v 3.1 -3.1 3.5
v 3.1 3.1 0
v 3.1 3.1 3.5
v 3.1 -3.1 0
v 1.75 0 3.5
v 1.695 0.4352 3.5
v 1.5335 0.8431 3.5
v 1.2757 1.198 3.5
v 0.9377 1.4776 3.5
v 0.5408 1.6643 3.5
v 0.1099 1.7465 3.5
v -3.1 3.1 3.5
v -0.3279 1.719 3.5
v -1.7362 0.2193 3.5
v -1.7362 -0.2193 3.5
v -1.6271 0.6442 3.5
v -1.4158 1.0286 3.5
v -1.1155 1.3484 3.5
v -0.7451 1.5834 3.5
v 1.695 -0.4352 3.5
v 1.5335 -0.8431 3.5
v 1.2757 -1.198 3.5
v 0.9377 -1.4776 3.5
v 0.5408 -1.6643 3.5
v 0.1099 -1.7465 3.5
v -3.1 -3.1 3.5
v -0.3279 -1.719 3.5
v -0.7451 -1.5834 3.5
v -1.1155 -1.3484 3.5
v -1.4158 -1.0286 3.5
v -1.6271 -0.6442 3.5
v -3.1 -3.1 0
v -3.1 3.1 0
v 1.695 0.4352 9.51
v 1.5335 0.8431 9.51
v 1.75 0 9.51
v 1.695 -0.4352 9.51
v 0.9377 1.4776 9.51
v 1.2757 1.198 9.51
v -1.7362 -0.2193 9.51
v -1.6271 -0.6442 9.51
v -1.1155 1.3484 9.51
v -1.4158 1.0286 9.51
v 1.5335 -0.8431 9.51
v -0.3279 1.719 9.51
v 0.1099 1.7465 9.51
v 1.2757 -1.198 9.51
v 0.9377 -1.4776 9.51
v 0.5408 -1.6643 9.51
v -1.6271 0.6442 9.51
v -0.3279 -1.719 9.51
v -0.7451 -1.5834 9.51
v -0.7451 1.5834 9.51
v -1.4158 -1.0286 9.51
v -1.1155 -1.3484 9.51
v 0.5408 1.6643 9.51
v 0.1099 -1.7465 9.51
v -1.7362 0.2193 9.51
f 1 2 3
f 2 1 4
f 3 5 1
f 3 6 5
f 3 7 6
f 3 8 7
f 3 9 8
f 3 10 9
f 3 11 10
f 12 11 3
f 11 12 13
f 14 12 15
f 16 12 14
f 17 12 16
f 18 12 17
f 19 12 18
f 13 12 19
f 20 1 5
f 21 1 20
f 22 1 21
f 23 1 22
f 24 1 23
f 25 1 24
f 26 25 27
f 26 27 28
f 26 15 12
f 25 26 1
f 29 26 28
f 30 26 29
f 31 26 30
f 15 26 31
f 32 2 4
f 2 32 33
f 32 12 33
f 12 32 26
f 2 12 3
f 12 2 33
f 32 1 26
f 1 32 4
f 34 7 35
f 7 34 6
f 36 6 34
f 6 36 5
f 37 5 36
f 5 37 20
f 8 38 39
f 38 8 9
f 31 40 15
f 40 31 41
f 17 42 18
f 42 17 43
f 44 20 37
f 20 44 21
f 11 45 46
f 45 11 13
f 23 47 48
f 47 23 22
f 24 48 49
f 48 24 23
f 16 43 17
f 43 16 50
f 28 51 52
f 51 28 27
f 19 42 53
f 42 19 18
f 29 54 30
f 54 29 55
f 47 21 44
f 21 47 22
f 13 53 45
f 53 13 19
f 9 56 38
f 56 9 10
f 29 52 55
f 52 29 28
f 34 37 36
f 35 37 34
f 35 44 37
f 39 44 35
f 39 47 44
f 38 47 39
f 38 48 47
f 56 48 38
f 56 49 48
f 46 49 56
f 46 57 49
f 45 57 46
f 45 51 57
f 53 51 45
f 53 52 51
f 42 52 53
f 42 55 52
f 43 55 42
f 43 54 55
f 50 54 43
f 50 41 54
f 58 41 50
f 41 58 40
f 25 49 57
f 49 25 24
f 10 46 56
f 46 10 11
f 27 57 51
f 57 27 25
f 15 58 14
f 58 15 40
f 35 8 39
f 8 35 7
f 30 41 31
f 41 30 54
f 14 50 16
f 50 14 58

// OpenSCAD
module button(x=6.2,y=6.2,h1=3.5,h2=13,d=3.5, center = false) {
    $fn=25;
    color([.4,.4,.4])
    if (center) {
        translate([-x/2,-y/2,0])
        union(){
            cube([x,y,h1]);
            translate([x/2,y/2,0.01 ]) cylinder(h=h2,d=d);
        };
    } else {
        union(){
            cube([x,y,h1]);
            translate([x/2,y/2,0.01 ]) cylinder(h=h2,d=d);
        };
    };
};

button(h2 =9.5,center=true);
